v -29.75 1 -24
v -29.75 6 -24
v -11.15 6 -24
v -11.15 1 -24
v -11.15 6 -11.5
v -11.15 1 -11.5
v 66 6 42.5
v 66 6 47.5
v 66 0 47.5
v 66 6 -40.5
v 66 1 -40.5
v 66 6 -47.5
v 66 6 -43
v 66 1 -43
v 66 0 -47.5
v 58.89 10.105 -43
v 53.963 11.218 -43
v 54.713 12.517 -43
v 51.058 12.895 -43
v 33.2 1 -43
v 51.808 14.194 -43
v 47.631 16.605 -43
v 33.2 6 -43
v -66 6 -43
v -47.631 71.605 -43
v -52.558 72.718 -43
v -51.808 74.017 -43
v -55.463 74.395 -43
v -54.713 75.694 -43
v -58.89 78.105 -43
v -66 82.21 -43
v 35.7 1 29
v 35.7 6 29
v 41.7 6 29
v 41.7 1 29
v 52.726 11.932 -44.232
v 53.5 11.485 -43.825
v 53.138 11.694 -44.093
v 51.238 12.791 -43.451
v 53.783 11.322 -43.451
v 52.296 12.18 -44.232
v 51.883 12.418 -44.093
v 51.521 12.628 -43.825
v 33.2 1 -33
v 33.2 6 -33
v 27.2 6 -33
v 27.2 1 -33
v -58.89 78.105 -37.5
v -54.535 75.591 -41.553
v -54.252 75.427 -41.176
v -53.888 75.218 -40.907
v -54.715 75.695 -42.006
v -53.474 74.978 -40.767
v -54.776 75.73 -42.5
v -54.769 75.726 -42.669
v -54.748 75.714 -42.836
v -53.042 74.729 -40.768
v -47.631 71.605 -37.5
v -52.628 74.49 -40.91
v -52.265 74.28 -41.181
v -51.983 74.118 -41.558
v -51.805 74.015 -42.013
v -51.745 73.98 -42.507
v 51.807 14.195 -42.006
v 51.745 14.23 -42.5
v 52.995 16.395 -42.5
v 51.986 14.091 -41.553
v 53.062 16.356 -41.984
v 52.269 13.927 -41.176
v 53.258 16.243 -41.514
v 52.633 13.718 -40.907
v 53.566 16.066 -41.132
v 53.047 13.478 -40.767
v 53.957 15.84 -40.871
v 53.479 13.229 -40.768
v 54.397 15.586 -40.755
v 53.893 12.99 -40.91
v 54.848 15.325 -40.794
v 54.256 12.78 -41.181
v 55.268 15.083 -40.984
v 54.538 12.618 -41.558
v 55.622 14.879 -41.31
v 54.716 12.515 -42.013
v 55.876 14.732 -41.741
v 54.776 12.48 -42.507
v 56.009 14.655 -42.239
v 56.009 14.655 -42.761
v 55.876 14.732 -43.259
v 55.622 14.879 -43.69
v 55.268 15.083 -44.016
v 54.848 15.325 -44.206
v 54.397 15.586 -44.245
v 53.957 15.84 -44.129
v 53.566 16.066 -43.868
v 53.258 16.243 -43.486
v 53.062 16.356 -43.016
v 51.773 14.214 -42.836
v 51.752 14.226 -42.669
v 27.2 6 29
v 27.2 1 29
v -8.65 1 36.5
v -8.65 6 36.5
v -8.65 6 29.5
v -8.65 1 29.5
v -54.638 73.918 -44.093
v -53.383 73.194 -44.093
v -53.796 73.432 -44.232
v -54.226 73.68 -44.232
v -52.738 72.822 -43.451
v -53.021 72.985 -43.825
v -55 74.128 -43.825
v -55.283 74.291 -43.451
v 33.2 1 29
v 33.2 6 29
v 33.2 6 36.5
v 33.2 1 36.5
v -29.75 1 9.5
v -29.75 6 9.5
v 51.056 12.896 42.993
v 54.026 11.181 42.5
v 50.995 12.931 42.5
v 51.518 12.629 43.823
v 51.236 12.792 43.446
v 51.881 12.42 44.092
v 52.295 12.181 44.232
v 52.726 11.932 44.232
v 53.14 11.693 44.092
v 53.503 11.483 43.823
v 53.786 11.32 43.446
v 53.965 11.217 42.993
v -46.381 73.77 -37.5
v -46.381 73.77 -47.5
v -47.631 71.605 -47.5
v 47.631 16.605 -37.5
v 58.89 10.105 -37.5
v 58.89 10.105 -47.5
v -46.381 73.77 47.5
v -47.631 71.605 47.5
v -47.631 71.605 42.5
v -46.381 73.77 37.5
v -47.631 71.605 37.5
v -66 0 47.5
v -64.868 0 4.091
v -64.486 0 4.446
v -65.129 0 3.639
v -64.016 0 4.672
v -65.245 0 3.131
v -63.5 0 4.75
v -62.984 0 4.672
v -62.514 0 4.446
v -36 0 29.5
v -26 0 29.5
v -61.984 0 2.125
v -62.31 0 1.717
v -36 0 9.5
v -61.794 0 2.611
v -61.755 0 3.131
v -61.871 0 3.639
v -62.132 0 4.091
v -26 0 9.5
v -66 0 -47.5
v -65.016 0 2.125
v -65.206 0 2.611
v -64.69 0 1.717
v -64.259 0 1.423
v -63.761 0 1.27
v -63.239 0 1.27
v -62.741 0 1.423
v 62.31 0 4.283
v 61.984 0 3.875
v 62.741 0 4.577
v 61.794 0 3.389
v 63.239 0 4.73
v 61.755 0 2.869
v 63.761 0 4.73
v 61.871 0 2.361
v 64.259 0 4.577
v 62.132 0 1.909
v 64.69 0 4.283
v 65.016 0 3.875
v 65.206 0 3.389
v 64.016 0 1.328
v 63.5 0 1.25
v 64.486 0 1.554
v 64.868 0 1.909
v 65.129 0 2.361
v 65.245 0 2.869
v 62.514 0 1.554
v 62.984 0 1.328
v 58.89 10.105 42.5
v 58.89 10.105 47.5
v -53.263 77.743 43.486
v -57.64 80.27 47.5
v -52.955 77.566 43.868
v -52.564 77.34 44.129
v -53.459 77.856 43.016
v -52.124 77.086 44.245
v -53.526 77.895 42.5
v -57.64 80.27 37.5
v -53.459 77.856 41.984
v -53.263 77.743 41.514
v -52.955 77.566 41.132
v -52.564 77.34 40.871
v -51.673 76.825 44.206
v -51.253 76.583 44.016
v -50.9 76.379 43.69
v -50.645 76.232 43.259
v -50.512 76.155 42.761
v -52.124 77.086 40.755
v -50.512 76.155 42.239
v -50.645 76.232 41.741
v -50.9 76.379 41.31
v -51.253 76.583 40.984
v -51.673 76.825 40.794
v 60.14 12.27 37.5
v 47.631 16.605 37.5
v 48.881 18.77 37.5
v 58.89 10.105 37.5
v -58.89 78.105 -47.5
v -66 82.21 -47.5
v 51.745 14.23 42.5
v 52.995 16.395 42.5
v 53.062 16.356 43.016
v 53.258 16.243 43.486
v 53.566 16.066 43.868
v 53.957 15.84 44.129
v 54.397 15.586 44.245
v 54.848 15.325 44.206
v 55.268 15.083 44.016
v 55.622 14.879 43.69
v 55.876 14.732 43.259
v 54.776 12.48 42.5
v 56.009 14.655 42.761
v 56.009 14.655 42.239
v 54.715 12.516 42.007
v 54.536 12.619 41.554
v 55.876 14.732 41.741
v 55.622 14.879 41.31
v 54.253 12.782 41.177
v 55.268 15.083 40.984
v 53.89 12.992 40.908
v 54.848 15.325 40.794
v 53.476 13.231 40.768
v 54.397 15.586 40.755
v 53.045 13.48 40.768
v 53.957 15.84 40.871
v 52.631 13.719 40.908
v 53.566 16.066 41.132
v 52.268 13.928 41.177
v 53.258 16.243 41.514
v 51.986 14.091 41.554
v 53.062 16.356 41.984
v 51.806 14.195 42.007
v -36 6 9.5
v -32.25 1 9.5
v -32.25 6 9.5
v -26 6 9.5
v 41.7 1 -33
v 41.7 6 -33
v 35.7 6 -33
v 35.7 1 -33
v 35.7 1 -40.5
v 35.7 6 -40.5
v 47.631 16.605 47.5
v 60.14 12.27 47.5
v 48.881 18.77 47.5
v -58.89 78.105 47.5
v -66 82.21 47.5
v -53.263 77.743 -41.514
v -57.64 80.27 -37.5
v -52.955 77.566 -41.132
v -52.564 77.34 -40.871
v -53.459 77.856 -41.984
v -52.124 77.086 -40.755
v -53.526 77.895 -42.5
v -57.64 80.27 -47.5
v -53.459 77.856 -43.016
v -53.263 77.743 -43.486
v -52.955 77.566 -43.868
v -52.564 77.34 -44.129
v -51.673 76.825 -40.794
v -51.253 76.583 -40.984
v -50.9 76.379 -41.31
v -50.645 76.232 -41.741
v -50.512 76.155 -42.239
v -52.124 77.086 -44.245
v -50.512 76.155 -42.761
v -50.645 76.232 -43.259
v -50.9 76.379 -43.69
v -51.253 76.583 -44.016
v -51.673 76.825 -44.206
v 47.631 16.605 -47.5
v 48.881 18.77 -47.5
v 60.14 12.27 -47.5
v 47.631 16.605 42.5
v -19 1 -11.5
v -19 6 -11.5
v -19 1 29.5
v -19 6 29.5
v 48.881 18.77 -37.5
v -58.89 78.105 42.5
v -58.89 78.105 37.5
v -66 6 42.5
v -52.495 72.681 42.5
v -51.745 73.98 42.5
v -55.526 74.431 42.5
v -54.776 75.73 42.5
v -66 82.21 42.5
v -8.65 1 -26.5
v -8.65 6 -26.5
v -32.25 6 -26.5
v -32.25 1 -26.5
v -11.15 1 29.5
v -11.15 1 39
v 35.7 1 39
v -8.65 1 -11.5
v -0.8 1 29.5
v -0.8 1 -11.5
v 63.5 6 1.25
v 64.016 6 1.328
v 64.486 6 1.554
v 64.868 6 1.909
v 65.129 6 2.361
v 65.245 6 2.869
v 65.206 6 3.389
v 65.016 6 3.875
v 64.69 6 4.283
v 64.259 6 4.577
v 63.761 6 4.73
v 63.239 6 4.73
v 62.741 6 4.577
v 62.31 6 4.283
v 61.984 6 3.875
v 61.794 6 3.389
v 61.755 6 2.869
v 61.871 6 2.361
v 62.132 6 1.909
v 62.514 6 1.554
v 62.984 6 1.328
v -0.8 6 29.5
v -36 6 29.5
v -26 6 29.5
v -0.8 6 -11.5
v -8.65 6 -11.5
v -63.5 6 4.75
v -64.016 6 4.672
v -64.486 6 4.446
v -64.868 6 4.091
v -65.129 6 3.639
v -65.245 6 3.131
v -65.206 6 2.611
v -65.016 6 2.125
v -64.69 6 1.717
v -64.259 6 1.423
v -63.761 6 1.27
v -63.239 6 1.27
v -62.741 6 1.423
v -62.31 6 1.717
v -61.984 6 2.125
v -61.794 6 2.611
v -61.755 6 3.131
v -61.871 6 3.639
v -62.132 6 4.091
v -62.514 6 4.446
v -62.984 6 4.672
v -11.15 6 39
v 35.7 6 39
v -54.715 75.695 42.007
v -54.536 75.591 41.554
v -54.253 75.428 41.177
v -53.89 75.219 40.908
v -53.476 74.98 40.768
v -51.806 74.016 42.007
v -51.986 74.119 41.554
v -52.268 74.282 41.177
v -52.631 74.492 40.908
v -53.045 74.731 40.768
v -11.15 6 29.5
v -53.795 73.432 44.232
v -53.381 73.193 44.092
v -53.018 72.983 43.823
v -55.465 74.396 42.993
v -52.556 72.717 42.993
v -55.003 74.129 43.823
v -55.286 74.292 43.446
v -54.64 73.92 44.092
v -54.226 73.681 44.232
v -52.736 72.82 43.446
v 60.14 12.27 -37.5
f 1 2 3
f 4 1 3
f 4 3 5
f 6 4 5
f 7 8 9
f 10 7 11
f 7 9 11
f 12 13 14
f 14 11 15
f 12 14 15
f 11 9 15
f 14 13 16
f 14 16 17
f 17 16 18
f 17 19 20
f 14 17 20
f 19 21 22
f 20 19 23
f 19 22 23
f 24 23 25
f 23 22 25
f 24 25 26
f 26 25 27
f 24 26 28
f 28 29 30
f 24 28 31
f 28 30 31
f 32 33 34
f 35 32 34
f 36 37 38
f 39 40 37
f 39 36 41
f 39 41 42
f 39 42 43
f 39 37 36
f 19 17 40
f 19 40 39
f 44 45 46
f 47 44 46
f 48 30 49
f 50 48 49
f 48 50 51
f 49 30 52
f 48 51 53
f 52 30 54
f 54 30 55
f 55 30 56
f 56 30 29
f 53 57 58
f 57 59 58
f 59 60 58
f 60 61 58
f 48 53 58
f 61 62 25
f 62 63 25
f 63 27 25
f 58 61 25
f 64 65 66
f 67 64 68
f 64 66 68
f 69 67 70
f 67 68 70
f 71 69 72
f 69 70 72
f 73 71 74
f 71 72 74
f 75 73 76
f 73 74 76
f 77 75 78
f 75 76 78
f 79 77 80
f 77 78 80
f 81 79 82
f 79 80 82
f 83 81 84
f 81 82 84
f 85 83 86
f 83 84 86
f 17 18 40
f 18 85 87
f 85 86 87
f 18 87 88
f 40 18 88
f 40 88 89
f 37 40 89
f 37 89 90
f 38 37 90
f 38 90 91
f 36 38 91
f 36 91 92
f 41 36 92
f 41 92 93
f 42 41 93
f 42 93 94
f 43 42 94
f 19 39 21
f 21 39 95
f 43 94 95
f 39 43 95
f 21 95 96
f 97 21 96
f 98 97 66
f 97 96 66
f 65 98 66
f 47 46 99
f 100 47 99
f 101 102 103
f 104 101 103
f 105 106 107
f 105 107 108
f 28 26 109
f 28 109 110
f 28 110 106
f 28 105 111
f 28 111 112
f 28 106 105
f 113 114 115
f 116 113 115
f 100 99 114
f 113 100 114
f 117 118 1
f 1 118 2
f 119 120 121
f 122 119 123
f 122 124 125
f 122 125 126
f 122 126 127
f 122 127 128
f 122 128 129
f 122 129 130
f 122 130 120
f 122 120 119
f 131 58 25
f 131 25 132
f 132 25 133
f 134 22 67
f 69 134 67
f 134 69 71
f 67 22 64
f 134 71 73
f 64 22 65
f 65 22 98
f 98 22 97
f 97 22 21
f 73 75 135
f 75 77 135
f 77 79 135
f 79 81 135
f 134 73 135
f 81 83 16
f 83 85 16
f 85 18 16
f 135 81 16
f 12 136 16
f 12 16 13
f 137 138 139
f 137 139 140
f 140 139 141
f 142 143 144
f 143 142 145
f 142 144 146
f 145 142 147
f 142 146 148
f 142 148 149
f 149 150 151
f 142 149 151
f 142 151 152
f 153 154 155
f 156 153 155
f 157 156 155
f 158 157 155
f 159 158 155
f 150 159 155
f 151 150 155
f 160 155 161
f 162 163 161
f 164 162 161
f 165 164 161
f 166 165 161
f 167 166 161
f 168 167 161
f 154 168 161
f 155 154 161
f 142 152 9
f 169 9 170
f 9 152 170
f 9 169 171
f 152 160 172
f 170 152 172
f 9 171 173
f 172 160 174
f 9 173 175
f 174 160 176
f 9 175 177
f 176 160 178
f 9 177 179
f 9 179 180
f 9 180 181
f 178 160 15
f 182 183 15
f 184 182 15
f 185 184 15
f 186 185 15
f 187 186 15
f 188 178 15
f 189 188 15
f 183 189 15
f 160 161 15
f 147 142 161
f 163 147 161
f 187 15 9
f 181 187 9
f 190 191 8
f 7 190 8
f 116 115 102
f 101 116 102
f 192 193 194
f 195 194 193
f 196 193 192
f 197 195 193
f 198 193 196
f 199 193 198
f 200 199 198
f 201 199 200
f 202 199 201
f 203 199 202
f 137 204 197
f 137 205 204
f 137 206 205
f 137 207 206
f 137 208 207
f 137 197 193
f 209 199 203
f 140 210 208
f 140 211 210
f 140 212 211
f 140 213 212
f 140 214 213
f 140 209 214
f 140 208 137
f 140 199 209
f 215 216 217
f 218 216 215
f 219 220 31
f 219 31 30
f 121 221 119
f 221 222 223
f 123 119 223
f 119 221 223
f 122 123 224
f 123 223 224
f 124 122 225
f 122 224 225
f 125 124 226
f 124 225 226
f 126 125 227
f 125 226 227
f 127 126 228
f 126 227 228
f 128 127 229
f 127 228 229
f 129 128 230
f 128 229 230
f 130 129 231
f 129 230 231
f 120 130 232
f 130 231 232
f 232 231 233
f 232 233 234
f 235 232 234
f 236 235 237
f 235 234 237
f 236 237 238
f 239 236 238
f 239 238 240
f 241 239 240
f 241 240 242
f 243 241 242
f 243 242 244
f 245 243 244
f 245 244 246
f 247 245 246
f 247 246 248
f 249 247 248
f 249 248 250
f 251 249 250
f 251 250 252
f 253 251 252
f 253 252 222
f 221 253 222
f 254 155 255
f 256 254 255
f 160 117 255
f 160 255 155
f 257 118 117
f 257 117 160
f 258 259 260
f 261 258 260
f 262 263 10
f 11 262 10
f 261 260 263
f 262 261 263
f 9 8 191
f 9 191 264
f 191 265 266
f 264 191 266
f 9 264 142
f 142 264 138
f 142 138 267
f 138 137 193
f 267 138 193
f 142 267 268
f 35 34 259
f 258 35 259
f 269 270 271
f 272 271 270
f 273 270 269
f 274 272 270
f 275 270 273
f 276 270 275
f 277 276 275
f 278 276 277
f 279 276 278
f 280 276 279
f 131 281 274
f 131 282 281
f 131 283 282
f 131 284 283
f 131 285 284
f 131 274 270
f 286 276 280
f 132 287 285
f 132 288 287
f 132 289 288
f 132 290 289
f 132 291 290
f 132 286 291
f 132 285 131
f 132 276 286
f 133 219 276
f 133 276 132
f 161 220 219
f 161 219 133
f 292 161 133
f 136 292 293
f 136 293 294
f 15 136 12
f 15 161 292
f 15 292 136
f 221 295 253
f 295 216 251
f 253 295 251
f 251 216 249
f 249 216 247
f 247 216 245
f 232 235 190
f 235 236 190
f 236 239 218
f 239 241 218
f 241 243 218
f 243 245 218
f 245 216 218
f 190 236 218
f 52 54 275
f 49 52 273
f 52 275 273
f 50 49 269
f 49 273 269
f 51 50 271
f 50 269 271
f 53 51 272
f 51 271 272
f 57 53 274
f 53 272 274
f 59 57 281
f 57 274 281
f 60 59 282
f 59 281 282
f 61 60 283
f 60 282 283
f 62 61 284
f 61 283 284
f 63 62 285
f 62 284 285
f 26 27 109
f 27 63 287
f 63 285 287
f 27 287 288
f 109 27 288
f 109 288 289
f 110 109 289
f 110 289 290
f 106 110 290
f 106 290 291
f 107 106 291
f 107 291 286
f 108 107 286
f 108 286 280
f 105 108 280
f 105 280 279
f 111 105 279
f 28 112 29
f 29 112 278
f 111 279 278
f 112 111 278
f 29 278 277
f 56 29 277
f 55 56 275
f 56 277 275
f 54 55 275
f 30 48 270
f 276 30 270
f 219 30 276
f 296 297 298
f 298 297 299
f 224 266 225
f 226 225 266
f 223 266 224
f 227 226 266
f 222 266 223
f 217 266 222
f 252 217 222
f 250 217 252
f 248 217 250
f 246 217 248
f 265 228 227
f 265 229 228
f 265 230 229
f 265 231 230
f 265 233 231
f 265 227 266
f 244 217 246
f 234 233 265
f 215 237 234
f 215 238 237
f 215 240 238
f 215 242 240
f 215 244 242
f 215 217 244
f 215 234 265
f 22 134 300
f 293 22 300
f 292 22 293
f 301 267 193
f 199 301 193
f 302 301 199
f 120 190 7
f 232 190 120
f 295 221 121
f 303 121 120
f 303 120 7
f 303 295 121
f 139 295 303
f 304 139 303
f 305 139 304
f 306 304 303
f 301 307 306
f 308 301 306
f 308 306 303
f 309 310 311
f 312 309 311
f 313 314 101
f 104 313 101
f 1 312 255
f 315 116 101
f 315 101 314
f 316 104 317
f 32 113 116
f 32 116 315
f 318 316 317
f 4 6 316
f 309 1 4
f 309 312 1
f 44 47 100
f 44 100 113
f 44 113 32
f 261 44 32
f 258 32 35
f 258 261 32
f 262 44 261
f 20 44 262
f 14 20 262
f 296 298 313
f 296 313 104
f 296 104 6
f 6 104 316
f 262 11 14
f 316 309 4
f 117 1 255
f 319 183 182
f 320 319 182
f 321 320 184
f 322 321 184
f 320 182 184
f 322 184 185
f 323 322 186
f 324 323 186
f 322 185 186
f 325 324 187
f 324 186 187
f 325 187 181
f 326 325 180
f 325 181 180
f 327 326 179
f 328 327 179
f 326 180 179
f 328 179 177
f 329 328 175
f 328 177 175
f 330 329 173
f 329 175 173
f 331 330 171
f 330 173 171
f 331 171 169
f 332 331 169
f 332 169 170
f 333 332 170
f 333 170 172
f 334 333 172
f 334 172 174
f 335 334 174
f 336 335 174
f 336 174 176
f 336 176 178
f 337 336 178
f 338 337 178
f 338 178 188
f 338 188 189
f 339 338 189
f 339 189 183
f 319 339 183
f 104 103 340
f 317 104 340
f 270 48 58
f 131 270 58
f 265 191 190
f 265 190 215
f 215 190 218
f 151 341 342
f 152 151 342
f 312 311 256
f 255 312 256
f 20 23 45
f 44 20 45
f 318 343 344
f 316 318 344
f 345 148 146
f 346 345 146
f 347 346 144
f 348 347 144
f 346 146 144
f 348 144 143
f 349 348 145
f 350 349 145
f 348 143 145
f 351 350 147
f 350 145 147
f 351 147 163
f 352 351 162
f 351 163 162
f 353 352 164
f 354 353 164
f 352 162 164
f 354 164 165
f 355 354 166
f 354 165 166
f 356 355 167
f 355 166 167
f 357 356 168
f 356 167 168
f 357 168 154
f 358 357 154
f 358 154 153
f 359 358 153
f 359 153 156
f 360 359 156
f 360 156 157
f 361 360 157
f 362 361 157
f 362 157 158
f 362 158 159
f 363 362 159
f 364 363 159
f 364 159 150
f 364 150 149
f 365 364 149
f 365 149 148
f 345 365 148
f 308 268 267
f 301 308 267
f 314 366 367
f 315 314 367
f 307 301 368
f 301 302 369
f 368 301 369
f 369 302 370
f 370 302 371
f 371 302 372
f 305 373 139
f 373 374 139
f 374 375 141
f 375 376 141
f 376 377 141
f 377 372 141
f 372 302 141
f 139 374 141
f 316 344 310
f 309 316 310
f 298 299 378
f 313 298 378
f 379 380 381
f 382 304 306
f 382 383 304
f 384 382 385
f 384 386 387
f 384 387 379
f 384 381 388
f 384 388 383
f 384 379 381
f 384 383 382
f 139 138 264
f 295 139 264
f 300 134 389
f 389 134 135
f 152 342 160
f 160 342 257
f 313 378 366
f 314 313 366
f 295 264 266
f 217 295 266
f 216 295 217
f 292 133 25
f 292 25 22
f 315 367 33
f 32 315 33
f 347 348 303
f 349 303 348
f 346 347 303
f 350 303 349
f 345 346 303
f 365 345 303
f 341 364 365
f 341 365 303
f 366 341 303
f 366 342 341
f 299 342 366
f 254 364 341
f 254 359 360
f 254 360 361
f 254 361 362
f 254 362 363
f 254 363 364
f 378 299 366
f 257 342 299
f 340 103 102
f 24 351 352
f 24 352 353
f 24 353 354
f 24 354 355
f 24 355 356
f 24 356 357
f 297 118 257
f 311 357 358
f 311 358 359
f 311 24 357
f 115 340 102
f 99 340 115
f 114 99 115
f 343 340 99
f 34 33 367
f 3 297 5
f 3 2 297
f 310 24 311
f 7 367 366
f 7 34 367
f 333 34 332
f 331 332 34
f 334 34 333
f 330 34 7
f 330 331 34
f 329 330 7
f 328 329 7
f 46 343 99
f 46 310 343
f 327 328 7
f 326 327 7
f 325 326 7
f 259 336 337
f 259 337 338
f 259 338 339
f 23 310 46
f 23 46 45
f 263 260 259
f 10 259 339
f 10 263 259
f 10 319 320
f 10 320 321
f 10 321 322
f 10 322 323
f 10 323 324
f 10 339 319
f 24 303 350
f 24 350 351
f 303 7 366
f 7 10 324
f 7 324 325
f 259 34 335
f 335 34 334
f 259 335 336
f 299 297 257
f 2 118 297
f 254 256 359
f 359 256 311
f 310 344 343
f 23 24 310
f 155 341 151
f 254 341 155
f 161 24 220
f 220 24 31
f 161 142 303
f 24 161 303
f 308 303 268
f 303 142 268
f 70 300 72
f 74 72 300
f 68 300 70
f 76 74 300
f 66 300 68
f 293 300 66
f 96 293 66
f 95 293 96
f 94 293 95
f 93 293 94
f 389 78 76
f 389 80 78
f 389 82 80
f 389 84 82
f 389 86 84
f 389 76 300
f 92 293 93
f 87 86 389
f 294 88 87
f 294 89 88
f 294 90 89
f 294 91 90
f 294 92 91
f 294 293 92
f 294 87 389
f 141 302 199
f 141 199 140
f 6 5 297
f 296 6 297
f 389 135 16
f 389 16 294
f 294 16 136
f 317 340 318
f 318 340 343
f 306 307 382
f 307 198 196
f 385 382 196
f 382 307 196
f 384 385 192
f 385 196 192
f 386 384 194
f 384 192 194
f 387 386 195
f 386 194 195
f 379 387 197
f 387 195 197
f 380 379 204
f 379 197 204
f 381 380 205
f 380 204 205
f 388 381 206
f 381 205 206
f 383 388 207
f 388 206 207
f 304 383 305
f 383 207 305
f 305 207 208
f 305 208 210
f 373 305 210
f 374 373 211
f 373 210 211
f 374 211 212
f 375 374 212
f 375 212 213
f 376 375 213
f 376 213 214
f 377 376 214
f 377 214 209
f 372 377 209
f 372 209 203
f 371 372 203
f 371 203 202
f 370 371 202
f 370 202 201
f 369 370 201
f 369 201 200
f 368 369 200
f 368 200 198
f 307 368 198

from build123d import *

# Parameters (mm, degrees)
SKETCH1_W           = 132
SKETCH1_H           = 95
BOSS_EXTRUDE1_DEPTH = 6
SKETCH3_W           = 10
SKETCH3_H           = 20
CUT_EXTRUDE2_DEPTH  = 10
CUT_EXTRUDE3_DEPTH  = 5
BOSS_EXTRUDE2_DEPTH = 4.5
BOSS_EXTRUDE3_DEPTH = 5
SKETCH9_R           = 1.75
CUT_EXTRUDE4_DEPTH  = 10
SKETCH10_W          = 13
SKETCH10_H          = 10
BOSS_EXTRUDE4_DEPTH = 2.5
SKETCH12_R          = 1.75
CUT_EXTRUDE6_DEPTH  = 4


with BuildPart() as part:
    # Sketch1 → Boss-Extrude1 (new body)
    with BuildSketch(Plane(origin=(0, 0, 0), x_dir=(1, 0, 0), z_dir=(0, 1, 0))):
        Rectangle(SKETCH1_W, SKETCH1_H)
    extrude(amount=BOSS_EXTRUDE1_DEPTH)

    # Sketch3 → Cut-Extrude2 (cut)
    with BuildSketch(Plane(origin=(0, 6, 0), x_dir=(1, 0, 0), z_dir=(0, 1, 0))):
        with Locations((-31, -19.5)):
            Rectangle(SKETCH3_W, SKETCH3_H)
    extrude(amount=-CUT_EXTRUDE2_DEPTH, mode=Mode.SUBTRACT)

    # Sketch4 → Cut-Extrude3 (cut)
    with BuildSketch(Plane(origin=(0, 6, 0), x_dir=(1, 0, 0), z_dir=(0, 1, 0))):
        Polygon((-11.15, 24), (-11.15, 11.5), (-19, 11.5), (-19, -29.5), (-11.15, -29.5), (-11.15, -39), (-8.65, -39), (33.2, -39), (35.7, -39), (35.7, -29), (41.7, -29), (41.7, 33), (35.7, 33), (35.7, 40.5), (66, 40.5), (66, 43), (35.7, 43), (33.2, 43), (33.2, 33), (27.2, 33), (27.2, -29), (33.2, -29), (33.2, -36.5), (-8.65, -36.5), (-8.65, -29.5), (-0.8, -29.5), (-0.8, 11.5), (-8.65, 11.5), (-8.65, 26.5), (-11.15, 26.5), (-32.25, 26.5), (-32.25, 24), (-32.25, -9.5), (-29.75, -9.5), (-29.75, 24), align=None)
    extrude(amount=-CUT_EXTRUDE3_DEPTH, mode=Mode.SUBTRACT)

    # Sketch6 → Boss-Extrude2 (add)
    with BuildSketch(Plane(origin=(0, 0, -47.5), x_dir=(-1, 0, 0), z_dir=(0, 0, -1))):
        Polygon((66, 6), (66, 82.210235533), (-66, 6), align=None)
    extrude(amount=-BOSS_EXTRUDE2_DEPTH)

    # Sketch7 → Boss-Extrude3 (add)
    with BuildSketch(Plane.XY.offset(47.5)):
        Polygon((-66, 6), (-66, 82.210235533), (66, 6), align=None)
    extrude(amount=-BOSS_EXTRUDE3_DEPTH)

    # Sketch9 → Cut-Extrude4 (cut)
    with BuildSketch(Plane.XZ):
        with Locations(Location((63.5, 3, 0), (0, 0, 270))):
            Circle(SKETCH9_R)
        with Locations(Location((-63.5, 3, 0), (0, 0, 90))):
            Circle(SKETCH9_R)
    extrude(amount=-CUT_EXTRUDE4_DEPTH, mode=Mode.SUBTRACT)

    # Sketch10 → Boss-Extrude4 (add)
    with BuildSketch(Plane(origin=(19.098076211, 33.078838325, 0), x_dir=(0.8660254037844417, -0.49999999999999495, 0), z_dir=(0.49999999999999495, 0.8660254037844417, 0))):
        with Locations((-83.552558883, 42.5)):
            Rectangle(SKETCH10_W, SKETCH10_H)
        with Locations((39.447441117, 42.5)):
            Rectangle(SKETCH10_W, SKETCH10_H)
        with Locations((-83.552558883, -42.5)):
            Rectangle(SKETCH10_W, SKETCH10_H)
        with Locations((39.447441117, -42.5)):
            Rectangle(SKETCH10_W, SKETCH10_H)
    extrude(amount=BOSS_EXTRUDE4_DEPTH)

    # Sketch12 → Cut-Extrude6 (cut)
    with BuildSketch(Plane(origin=(20.348076211, 35.243901834, 0), x_dir=(0.8660254037844417, -0.4999999999999949, 0), z_dir=(0.4999999999999949, 0.8660254037844417, 0))):
        with Locations(Location((39.447441117, 42.5, 0), (0, 0, 180))):
            Circle(SKETCH12_R)
        with Locations(Location((-83.552558883, 42.5, 0), (0, 0, 180))):
            Circle(SKETCH12_R)
        with Locations(Location((-83.552558883, -42.5, 0), (0, 0, 180))):
            Circle(SKETCH12_R)
        with Locations(Location((39.447441117, -42.5, 0), (0, 0, 180))):
            Circle(SKETCH12_R)
    extrude(amount=-CUT_EXTRUDE6_DEPTH, mode=Mode.SUBTRACT)


solid = part.part
